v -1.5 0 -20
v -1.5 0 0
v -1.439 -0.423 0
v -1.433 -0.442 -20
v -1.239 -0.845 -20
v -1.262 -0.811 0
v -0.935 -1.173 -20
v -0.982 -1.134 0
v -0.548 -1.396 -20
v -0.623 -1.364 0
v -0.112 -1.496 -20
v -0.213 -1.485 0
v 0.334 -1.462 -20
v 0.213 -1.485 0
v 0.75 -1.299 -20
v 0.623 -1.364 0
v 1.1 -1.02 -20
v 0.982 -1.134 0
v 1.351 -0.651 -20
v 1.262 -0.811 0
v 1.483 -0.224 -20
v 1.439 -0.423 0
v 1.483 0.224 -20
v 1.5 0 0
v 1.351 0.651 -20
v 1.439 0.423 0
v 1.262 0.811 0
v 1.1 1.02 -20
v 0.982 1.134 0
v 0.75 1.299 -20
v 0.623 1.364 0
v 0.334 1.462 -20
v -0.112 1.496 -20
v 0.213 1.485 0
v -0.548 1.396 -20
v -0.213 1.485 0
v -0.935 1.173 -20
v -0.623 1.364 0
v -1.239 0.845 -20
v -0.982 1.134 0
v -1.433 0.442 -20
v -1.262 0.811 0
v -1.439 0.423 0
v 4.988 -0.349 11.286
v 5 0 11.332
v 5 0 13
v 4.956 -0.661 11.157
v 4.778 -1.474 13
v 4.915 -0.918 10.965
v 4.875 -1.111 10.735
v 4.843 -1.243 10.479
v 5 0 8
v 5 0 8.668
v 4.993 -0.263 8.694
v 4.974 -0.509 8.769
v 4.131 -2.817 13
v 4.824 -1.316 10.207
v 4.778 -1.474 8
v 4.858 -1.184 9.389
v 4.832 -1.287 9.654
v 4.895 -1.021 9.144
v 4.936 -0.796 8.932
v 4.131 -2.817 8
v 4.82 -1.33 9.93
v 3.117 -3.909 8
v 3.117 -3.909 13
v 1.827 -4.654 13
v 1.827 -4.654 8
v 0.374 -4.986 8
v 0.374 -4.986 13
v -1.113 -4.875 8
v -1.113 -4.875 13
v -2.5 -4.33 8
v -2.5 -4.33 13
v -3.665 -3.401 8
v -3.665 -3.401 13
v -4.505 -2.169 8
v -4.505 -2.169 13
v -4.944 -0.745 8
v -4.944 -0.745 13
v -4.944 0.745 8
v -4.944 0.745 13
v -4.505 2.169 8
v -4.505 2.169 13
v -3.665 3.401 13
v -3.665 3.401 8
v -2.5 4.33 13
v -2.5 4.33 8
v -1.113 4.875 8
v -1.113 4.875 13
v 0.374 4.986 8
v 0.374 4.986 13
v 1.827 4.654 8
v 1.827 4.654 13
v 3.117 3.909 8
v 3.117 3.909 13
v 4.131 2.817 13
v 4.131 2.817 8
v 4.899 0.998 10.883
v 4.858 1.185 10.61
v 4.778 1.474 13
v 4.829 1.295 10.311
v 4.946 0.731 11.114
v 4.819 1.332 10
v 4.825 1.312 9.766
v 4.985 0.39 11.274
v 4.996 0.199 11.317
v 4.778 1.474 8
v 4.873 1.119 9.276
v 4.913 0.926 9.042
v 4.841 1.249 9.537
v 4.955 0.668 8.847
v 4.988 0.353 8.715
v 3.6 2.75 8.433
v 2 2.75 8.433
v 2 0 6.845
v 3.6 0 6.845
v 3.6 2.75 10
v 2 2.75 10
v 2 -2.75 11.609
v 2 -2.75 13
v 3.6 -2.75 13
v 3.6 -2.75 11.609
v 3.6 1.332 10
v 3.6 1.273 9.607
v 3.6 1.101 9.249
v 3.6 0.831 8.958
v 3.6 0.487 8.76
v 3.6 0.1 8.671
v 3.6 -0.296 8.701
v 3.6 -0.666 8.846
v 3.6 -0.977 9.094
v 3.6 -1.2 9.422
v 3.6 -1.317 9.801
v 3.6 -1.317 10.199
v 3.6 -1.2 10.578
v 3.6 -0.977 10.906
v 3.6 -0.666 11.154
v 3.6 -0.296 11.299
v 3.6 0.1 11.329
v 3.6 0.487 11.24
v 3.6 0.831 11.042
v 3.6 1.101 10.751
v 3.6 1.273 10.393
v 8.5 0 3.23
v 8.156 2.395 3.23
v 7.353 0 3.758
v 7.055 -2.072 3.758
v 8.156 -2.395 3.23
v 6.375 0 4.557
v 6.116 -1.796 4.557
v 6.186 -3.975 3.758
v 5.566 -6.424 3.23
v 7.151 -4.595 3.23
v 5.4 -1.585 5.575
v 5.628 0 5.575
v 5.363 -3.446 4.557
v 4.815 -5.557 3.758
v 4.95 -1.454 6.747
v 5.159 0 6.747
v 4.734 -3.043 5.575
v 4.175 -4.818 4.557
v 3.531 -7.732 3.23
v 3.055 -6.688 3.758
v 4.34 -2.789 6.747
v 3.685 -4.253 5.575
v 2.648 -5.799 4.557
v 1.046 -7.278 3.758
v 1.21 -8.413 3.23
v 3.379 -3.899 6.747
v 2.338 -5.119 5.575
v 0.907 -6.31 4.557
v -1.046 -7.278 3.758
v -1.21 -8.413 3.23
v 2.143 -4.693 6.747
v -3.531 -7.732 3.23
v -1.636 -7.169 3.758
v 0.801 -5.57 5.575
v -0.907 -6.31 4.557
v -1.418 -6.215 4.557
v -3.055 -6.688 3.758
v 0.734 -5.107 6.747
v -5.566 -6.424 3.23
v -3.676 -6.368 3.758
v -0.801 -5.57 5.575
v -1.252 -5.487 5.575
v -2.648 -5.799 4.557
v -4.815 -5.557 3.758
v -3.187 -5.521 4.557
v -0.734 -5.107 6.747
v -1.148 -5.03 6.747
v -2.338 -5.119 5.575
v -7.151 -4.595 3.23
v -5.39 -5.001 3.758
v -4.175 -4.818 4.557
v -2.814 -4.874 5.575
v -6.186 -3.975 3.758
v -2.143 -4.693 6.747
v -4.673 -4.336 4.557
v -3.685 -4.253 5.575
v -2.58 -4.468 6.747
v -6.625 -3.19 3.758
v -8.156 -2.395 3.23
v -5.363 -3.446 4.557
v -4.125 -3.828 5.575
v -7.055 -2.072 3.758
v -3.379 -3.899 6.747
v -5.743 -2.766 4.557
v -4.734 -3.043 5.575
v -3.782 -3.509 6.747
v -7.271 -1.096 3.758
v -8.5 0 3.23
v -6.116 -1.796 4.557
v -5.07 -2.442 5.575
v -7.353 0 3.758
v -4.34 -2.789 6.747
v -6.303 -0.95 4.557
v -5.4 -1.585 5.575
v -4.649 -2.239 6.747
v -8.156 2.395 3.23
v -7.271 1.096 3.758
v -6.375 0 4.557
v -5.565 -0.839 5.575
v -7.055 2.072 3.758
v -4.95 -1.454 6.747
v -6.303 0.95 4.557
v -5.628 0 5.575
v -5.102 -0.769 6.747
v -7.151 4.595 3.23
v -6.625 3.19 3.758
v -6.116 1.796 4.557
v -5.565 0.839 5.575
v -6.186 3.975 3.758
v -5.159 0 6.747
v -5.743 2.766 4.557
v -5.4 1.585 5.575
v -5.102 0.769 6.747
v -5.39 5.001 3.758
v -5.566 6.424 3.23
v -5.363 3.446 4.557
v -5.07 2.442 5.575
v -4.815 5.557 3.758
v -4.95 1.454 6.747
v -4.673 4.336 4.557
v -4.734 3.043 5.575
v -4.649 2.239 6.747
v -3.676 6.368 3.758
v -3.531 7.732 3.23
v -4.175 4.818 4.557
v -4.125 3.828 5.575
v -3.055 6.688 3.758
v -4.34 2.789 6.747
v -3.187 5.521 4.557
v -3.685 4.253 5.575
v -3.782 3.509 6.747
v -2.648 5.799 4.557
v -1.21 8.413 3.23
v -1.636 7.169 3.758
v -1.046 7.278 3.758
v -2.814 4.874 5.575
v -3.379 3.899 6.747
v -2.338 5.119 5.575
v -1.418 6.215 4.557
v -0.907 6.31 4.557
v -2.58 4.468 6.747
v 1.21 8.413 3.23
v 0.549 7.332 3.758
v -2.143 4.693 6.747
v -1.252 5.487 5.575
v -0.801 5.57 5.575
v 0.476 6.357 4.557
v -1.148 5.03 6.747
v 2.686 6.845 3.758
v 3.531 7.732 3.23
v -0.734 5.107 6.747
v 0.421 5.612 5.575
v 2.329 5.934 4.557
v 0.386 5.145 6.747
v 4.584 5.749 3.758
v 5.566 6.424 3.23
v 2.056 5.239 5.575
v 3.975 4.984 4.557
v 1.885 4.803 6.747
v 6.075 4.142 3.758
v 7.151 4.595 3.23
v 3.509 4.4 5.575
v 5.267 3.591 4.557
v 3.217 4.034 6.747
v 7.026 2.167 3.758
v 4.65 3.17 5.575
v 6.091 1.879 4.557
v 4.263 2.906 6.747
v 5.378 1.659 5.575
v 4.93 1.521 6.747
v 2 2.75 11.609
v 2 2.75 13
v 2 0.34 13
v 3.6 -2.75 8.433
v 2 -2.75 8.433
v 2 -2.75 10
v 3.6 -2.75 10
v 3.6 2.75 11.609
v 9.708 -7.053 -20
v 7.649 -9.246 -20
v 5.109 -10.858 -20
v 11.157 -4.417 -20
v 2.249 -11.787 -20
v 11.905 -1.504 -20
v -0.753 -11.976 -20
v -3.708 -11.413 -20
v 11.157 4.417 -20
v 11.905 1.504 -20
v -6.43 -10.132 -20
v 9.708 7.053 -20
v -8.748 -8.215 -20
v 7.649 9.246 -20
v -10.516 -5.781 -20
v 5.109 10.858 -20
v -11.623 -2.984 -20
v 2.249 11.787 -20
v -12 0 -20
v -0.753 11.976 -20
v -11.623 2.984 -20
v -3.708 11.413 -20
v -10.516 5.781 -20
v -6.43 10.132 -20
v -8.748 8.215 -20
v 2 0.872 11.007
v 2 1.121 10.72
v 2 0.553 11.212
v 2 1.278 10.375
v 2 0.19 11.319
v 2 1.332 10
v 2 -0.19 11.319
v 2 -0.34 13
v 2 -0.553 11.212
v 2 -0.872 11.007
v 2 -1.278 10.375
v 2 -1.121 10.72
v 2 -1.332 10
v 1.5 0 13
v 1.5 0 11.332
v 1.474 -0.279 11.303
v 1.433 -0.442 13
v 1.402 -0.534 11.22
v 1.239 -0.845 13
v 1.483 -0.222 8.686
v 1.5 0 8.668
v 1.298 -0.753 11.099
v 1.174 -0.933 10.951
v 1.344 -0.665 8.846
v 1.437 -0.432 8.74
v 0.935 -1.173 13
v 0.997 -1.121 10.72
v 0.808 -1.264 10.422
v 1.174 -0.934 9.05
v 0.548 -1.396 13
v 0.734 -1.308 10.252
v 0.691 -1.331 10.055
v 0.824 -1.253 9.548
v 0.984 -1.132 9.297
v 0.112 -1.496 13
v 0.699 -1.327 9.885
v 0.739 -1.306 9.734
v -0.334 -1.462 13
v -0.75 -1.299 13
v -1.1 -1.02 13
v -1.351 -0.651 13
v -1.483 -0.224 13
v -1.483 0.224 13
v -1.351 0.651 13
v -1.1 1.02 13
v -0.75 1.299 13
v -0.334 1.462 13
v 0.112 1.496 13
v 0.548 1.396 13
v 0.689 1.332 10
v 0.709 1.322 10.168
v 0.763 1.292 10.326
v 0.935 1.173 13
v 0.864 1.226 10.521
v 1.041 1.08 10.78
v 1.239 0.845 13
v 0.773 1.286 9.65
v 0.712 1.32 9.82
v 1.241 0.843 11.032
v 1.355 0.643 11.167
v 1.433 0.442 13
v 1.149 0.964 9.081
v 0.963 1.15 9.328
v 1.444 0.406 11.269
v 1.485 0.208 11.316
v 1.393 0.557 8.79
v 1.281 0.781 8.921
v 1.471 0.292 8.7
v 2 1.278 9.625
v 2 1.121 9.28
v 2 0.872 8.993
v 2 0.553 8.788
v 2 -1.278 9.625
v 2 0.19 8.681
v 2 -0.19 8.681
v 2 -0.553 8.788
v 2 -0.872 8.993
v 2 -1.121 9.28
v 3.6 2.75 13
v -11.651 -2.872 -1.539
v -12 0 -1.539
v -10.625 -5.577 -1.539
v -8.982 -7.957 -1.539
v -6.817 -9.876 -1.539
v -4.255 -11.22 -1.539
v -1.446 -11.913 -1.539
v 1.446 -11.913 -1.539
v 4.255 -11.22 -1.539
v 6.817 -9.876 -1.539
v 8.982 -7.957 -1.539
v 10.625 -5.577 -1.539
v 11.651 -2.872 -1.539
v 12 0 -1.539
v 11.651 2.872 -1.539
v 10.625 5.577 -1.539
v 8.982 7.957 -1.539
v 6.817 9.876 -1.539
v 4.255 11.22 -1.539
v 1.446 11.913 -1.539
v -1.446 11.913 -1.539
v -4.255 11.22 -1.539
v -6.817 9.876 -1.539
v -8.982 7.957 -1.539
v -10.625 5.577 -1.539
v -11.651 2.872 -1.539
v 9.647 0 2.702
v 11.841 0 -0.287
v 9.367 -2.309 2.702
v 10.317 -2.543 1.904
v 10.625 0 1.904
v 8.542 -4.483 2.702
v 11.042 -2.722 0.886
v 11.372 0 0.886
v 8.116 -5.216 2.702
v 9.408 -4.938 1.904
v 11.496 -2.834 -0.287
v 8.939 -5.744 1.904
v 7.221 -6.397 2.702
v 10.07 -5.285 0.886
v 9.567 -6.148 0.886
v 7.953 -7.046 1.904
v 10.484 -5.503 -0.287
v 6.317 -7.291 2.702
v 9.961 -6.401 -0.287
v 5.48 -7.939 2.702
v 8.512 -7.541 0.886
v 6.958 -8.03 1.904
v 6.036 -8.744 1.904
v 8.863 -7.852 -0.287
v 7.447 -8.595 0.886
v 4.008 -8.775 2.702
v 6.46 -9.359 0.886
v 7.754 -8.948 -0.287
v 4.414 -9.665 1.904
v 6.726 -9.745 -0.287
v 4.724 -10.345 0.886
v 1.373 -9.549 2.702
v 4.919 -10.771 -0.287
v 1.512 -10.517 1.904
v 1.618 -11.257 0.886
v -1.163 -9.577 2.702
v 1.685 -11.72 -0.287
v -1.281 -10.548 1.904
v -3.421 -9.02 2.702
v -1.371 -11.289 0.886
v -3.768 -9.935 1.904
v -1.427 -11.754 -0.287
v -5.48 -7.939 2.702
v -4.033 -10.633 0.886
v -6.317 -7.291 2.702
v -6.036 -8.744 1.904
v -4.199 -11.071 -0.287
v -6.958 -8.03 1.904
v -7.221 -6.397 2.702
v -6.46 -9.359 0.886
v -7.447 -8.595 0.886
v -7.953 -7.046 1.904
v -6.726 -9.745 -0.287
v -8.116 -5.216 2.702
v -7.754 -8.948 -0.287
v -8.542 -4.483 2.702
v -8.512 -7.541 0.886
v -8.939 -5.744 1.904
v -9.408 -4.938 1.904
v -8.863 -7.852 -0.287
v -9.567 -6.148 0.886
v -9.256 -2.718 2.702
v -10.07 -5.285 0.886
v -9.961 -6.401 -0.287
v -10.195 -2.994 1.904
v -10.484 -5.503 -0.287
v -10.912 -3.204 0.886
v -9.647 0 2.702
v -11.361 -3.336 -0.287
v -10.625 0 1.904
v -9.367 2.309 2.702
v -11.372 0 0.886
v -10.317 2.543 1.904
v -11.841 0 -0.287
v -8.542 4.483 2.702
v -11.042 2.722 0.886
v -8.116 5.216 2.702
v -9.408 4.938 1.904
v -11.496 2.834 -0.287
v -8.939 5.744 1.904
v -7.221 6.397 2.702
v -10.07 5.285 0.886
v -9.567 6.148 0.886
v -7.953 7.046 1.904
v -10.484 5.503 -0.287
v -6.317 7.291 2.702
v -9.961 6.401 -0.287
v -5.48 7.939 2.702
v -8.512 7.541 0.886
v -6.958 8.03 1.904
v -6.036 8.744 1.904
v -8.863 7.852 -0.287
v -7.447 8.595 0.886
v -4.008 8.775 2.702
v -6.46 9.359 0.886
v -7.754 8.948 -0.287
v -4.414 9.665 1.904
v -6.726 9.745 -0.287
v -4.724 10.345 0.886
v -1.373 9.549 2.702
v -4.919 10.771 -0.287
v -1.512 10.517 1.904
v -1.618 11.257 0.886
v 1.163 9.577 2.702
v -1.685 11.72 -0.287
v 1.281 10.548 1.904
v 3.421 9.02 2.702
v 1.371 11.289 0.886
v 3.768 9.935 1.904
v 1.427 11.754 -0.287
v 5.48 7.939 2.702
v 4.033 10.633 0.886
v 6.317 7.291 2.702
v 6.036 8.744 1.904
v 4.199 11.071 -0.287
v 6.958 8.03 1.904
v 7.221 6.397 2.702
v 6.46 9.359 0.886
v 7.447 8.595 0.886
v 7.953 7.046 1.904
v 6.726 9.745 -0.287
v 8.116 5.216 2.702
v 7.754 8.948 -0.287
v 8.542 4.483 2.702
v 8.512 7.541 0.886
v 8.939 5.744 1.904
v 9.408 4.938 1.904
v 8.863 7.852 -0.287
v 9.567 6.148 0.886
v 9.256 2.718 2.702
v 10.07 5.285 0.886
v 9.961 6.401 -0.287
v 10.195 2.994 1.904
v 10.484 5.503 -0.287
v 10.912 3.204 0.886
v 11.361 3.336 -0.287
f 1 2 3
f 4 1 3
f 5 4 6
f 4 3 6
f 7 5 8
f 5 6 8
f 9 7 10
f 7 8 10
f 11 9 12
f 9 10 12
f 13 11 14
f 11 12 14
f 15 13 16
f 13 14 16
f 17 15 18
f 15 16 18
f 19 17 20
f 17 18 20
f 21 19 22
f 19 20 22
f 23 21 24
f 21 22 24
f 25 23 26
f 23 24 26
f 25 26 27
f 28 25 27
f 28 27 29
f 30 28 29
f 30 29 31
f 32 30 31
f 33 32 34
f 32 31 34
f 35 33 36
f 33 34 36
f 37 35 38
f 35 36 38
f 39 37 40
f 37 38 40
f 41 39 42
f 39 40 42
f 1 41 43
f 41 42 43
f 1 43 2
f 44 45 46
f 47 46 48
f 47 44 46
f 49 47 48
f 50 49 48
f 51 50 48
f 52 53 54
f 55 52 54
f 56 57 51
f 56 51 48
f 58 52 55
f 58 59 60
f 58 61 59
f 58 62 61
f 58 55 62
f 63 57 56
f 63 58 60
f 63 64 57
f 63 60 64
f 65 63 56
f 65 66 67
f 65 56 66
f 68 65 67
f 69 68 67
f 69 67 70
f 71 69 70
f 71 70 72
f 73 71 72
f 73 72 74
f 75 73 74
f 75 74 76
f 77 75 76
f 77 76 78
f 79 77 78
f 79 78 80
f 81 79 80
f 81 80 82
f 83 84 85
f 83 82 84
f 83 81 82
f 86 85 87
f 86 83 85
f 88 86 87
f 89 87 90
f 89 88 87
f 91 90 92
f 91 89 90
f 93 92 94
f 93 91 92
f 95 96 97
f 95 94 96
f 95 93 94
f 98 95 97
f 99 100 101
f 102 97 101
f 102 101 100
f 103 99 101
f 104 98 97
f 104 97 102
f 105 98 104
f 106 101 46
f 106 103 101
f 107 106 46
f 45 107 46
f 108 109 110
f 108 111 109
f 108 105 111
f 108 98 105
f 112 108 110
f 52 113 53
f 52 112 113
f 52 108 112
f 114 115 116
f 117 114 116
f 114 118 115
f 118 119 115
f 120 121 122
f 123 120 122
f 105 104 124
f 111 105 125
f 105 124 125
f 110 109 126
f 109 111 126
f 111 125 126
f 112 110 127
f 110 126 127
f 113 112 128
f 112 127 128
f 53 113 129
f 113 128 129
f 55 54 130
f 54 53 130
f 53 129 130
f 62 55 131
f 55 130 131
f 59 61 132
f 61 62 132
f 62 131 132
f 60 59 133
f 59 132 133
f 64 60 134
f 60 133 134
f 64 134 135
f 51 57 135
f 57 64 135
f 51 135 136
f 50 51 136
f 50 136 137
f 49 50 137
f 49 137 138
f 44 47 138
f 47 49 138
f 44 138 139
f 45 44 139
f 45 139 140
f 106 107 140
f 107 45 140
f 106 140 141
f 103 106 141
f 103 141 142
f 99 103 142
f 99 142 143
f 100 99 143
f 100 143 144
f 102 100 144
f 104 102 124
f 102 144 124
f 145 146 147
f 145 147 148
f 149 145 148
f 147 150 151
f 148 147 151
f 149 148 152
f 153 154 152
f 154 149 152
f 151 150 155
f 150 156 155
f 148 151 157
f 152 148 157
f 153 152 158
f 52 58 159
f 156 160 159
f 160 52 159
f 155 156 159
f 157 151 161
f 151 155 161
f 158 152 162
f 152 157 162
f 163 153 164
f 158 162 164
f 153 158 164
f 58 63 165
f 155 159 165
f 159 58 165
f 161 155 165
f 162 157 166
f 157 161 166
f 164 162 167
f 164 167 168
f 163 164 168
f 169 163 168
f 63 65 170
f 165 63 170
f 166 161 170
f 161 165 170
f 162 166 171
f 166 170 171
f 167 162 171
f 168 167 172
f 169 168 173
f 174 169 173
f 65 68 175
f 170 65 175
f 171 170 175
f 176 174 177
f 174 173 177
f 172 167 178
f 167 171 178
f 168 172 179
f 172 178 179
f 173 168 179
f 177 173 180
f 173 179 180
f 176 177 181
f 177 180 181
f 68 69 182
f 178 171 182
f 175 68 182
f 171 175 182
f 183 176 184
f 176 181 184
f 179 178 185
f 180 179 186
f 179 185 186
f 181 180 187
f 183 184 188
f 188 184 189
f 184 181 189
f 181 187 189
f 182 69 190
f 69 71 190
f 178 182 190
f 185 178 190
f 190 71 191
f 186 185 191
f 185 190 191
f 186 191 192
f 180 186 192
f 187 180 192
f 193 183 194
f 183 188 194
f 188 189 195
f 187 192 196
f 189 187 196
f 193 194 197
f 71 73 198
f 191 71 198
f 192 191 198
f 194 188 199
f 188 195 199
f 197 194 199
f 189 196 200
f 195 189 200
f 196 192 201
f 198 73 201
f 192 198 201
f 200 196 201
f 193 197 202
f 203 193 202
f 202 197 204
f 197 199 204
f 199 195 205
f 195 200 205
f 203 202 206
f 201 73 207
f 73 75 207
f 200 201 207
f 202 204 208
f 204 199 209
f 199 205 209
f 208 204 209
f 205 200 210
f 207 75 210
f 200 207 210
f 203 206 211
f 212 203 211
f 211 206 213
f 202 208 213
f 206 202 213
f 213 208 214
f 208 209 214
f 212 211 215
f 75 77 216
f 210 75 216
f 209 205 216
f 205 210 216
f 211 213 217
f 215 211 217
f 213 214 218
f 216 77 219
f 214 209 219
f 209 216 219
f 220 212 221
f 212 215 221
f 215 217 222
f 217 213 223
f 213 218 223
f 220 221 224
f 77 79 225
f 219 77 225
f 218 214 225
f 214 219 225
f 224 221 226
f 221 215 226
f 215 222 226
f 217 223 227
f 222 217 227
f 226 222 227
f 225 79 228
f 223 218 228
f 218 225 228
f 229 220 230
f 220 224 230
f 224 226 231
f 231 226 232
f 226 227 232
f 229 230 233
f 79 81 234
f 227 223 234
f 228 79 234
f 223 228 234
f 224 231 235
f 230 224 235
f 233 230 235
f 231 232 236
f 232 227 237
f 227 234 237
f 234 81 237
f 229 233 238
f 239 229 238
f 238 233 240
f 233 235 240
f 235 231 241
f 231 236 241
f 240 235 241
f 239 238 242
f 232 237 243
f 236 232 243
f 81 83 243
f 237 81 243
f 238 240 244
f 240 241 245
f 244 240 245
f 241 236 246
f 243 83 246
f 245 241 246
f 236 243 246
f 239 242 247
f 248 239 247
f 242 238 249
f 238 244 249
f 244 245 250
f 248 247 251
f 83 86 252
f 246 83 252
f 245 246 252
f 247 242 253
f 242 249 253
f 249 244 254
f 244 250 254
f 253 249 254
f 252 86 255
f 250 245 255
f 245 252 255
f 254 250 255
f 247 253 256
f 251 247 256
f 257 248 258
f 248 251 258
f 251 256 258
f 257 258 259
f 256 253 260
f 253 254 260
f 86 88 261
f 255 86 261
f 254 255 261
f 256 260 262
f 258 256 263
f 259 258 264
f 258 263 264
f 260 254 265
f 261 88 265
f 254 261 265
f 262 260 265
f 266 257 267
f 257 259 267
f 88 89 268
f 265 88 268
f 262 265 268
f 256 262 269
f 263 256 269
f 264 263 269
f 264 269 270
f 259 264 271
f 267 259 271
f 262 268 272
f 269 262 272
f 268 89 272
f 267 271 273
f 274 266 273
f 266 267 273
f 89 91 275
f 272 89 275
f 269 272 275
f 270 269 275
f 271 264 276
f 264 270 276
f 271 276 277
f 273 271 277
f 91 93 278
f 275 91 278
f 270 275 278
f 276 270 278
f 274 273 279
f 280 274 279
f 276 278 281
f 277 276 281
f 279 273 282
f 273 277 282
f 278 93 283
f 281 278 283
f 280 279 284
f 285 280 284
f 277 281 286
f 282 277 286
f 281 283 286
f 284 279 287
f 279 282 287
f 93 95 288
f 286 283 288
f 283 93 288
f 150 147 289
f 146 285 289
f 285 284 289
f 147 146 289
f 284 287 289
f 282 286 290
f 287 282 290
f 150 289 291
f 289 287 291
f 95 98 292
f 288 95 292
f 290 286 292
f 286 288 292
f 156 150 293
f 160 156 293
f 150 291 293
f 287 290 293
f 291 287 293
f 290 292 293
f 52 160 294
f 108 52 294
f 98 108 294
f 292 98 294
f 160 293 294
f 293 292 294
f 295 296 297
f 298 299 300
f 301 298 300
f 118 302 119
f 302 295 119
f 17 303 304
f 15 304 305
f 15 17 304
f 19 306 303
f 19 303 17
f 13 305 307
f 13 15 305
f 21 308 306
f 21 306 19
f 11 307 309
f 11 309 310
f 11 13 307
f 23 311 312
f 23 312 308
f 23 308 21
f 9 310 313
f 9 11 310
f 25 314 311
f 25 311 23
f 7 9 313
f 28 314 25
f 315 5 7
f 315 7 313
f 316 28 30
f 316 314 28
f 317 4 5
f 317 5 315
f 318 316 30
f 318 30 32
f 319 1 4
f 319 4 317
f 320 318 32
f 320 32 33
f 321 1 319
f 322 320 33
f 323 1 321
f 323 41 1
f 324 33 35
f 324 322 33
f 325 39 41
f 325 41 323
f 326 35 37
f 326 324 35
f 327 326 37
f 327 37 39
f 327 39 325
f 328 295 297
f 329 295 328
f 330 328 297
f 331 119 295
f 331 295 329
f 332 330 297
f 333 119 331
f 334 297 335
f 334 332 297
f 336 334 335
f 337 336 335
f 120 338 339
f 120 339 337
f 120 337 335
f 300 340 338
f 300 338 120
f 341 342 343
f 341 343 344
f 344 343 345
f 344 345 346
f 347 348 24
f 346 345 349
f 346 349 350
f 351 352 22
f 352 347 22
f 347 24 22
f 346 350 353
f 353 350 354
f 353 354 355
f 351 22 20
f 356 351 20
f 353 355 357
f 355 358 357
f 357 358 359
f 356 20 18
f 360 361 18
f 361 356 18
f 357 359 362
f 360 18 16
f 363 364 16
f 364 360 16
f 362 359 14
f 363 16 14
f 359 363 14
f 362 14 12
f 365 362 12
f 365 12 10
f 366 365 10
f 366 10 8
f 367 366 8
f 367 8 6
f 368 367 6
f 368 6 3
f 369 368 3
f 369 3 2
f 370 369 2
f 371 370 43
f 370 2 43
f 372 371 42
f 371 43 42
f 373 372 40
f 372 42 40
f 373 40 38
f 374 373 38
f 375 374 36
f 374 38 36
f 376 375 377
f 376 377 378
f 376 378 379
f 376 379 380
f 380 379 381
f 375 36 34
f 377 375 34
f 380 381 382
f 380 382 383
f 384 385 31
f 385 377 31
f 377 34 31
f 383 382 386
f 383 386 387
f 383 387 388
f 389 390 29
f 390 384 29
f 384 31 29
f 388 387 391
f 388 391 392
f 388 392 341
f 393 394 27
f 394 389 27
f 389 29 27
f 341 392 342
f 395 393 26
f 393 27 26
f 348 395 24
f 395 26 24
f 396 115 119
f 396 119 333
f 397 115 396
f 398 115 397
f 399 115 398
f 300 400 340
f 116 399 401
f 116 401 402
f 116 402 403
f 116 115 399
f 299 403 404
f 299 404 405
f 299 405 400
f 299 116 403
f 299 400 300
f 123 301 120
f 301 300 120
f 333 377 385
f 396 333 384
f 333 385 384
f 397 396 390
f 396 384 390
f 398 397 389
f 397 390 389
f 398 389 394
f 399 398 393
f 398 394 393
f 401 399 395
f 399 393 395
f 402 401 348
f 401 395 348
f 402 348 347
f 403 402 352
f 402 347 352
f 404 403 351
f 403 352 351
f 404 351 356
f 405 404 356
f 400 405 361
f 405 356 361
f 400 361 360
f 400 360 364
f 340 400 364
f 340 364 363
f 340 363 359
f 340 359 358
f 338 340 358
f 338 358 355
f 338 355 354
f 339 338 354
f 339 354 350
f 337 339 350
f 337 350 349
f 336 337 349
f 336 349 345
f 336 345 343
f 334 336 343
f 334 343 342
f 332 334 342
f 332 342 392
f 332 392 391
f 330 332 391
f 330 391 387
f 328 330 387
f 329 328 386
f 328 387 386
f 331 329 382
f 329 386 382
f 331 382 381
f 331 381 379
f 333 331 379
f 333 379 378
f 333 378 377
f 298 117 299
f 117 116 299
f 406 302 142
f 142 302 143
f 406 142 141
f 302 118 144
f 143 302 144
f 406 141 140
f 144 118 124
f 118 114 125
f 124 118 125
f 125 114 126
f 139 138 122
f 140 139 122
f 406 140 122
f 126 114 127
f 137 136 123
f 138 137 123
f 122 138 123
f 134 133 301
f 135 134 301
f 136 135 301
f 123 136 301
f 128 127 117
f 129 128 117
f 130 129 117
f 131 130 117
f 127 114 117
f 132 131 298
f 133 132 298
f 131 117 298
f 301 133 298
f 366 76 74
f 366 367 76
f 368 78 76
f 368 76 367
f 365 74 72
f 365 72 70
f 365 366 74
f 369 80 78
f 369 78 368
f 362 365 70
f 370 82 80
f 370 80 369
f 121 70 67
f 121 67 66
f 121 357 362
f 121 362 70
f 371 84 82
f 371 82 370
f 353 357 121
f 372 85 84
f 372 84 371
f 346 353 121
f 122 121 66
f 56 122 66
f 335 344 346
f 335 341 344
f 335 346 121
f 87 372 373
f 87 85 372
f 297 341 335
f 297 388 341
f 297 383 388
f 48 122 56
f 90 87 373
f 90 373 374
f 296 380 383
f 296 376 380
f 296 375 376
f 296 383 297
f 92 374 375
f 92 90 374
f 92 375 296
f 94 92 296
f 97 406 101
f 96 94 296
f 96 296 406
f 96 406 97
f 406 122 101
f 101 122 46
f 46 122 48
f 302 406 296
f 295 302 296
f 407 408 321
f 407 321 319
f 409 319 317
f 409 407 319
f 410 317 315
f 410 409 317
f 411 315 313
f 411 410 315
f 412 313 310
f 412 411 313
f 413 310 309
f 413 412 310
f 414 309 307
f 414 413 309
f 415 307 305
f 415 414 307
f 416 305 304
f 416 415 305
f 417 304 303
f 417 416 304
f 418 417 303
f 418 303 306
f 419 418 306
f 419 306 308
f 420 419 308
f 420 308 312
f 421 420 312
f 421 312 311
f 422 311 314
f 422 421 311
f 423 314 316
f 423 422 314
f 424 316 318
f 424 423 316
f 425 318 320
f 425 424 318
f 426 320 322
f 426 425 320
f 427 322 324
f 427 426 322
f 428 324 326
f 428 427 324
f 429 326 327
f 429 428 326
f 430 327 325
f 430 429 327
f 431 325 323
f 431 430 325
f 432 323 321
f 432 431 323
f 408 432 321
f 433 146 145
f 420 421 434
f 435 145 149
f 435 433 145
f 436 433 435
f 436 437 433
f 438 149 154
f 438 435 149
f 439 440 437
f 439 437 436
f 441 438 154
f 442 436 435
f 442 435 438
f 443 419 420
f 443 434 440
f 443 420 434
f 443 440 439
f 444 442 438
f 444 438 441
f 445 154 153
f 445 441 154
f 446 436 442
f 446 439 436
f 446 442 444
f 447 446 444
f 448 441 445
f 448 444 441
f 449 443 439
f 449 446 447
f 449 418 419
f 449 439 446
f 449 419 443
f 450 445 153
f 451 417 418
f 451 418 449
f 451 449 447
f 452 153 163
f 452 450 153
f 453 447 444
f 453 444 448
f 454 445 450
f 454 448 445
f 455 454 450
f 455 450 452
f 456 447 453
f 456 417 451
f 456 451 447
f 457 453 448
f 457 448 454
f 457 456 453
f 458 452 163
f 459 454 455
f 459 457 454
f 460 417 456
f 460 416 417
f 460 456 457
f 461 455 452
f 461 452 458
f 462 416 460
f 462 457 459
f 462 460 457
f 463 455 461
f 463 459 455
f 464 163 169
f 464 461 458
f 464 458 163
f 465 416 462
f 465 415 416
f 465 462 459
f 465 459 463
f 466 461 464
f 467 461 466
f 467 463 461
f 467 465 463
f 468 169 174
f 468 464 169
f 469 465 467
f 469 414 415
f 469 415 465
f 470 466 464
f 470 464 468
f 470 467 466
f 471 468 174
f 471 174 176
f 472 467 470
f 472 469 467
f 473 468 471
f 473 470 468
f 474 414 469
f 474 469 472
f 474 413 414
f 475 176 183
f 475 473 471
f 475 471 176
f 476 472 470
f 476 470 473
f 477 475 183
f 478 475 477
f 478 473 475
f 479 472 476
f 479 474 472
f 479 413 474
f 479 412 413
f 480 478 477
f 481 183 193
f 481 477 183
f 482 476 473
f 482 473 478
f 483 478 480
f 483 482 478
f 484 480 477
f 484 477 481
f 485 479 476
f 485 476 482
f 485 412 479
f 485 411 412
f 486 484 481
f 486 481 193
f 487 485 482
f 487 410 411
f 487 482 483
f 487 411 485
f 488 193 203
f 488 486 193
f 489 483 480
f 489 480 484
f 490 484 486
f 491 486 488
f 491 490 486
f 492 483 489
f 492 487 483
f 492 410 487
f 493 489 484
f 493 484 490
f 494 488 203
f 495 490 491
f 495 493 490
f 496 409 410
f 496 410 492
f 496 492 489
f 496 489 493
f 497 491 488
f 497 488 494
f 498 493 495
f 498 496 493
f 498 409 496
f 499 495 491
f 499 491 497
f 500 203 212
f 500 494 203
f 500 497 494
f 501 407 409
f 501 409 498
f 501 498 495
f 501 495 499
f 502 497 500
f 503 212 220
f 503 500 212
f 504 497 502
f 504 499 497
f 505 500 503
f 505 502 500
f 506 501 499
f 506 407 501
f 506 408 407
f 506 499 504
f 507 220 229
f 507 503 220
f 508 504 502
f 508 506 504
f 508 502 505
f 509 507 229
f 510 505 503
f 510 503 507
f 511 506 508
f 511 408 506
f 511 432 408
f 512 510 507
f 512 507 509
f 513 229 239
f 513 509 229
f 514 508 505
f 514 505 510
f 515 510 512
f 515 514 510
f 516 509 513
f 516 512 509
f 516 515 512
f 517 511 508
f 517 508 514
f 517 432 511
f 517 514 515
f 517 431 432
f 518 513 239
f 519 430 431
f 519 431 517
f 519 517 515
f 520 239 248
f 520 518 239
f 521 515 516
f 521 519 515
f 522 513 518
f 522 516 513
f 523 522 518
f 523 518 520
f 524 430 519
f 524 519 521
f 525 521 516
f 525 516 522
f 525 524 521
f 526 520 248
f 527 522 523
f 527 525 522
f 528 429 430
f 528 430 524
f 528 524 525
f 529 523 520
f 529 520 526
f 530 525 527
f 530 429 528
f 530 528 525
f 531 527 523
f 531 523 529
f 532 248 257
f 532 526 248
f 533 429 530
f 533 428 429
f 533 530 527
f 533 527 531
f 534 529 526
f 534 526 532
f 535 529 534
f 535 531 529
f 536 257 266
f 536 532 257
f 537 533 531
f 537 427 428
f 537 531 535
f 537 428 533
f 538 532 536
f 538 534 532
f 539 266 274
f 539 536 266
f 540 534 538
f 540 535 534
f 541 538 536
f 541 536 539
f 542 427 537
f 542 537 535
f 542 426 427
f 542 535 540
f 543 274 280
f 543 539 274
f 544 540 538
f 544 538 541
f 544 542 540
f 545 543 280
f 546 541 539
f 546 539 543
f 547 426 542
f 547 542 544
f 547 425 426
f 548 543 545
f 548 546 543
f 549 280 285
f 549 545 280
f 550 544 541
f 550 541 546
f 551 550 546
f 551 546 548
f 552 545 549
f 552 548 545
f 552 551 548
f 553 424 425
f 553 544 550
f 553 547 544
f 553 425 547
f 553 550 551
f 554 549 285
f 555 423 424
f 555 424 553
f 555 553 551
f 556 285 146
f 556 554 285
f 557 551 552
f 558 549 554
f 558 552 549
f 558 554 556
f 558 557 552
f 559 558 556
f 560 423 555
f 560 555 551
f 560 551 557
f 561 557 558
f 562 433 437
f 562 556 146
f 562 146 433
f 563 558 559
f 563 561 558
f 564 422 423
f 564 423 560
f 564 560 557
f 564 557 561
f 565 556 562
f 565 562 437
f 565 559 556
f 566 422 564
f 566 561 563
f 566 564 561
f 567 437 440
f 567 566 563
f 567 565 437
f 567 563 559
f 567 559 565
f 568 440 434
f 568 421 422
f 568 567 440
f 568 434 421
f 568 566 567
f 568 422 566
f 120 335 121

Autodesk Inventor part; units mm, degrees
ref_plane "YZ Plane" through (0, 0, 0) normal (1, 0, 0) x (0, 1, 0)
sketch "Sketch1" plane through (0, 0, 0) normal (0, 0, 1) x (1, 0, 0)
  circle A0 centre (0, 0) radius 12
  circle A1 centre (0, 0) radius 1.5
  dimension "d0" = 24
  dimension "d2" = 3
extrude "Extrusion1" add sketch "Sketch1" along normal blind 3
sketch "Sketch2" plane through (0, 0, 3) normal (0, 0, 1) x (1, 0, 0)
  circle A0 centre (0, 0) radius 1.5 projected
  circle A1 centre (0, 0) radius 12 projected
  circle A2 centre (0, 0) radius 5
  dimension "d5" = 10
extrude "Extrusion2" add sketch "Sketch2" along normal blind 10 contours A2
sketch "Sketch14" plane through (0, 0, 0) normal (0, 0, -1) x (-1, 0, 0)
  circle A0 centre (0, 0) radius 1.5 projected
  circle A1 centre (0, 0) radius 12 projected
extrude "Extrusion11" add sketch "Sketch14" along normal blind 20
ref_plane "Work Plane6" through (0, 0, 8) normal (0, 0, 1) x (1, 0, 0)
sketch "Sketch15" plane through (0, 0, 8) normal (0, 0, 1) x (1, 0, 0)
  line L0 (0, -4.8919) -> (0, 6.5751)
  point P0 (0, 0)
ref_plane "Work Plane7" through (0, -4.8919, 8) normal (1, 0, 0) x (0, 1, 0)
fillet "Fillet3" radius 5 1 edges at (-5, 0, 3)
fillet "Fillet4" radius 5 1 edges at (-12, 0, 3)
sketch "Sketch17" plane through (0, 0, 13) normal (0, 0, 1) x (1, 0, 0)
  circle A0 centre (0, 0) radius 1.5 projected
  circle A1 centre (0, 0) radius 5 projected
  line L0 (0, -5) -> (0, 5)
ref_plane "Work Plane8" through (0, -5, 13) normal (1, 0, 0) x (0, 1, 0)
sketch "Sketch18" plane through (0, -5, 13) normal (1, 0, 0) x (0, 1, 0)
  circle A0 centre (5, -3) radius 1.3323
  line L0 (10, 0) -> (0, 0) projected
  point P0 (5, -13)
  dimension "d88" = 3
extrude "Extrusion13" cut sketch "Sketch18" along normal blind 10
sketch "Sketch19" plane through (0, 0, 13) normal (0, 0, 1) x (1, 0, 0)
  circle A0 centre (0, 0) radius 1.5 projected
  line L0 (2, -2.75) -> (3.6, -2.75)
  line L1 (3.6, -2.75) -> (3.6, 2.75)
  line L2 (3.6, 2.75) -> (2, 2.75)
  line L3 (2, 2.75) -> (2, -2.75)
  dimension "d91" = 5.5
  dimension "d93" = 2.75
  dimension "d94" = 1.6
  dimension "d95" = 2
ref_plane "Work Plane9" through (2, 2.75, 13) normal (1, 0, 0) x (0, -1, 0)
sketch "Sketch20" plane through (2, 2.75, 13) normal (1, 0, 0) x (0, -1, 0)
  line L0 (2.75, 6.1546) -> (5.5, 4.5669)
  line L1 (5.5, 4.5669) -> (5.5, 1.3914)
  line L2 (5.5, 1.3914) -> (2.75, -0.1963)
  line L3 (2.75, -0.1963) -> (0, 1.3914)
  line L4 (0, 1.3914) -> (0, 4.5669)
  line L5 (0, 4.5669) -> (2.75, 6.1546)
  point P0 (2.75, 13)
  point P1 (2.75, 2.9792)
  dimension "d97" = 5.5
extrude "Extrusion14" cut sketch "Sketch20" along normal blind 1.6
sketch "Sketch21" plane through (0, 0, 13) normal (0, 0, 1) x (1, 0, 0)
  line L0 (2, 0.34) -> (3.6, 0.34) projected
  line L1 (3.6, 0.34) -> (3.6, -0.34) projected
  line L2 (3.6, -0.34) -> (2, -0.34) projected
  line L3 (2, -0.34) -> (2, 0.34) projected
  circle A0 centre (0, 0) radius 1.5 projected
  circle A1 centre (0, 0) radius 5 projected
  line L4 (2, -2.7571) -> (3.6, -2.7571)
  line L5 (3.6, -2.7571) -> (3.6, 2.7571)
  line L6 (3.6, 2.7571) -> (2, 2.7571)
  line L7 (2, 2.7571) -> (2, -2.7571)
extrude "Extrusion15" cut sketch "Sketch19" against normal blind 3 contours L3 L2 L1 L0
properties part number "support shaft end"
